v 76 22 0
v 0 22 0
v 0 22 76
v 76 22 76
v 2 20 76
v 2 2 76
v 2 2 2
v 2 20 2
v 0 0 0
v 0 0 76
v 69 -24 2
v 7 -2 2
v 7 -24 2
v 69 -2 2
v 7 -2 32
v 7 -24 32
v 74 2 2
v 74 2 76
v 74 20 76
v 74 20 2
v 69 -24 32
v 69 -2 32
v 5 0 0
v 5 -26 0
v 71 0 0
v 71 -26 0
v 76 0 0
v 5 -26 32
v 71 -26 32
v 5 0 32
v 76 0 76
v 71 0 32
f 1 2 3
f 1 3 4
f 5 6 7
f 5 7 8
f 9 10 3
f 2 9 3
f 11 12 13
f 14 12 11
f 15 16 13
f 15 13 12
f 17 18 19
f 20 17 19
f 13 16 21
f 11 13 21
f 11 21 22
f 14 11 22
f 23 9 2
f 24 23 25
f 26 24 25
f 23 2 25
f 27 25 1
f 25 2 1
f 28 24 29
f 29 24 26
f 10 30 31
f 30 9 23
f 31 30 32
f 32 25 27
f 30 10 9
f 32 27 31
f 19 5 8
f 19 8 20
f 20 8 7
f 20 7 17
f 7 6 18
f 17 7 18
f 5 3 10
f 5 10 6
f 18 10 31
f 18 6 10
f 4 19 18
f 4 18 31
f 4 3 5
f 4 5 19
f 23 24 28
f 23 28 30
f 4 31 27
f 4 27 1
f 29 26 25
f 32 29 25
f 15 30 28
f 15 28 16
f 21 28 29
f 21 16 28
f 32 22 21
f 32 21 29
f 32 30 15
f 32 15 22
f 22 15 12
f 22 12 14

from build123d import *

# Parameters (mm, degrees)
SKETCH_W        = 76
SKETCH_H        = 22
PAD_DEPTH       = 76
SKETCH001_W     = 66
SKETCH001_H     = 26
PAD001_DEPTH    = 32
SKETCH002_W     = 62
SKETCH002_H     = 22
POCKET_DEPTH    = 30
SKETCH003_W     = 72
SKETCH003_H     = 18
POCKET001_DEPTH = 74


with BuildPart() as part:
    # Sketch → Pad (new body)
    with BuildSketch(Plane.XY):
        with Locations((38, 11)):
            Rectangle(SKETCH_W, SKETCH_H)
    extrude(amount=PAD_DEPTH)

    # Sketch001 → Pad001 (join)
    with BuildSketch(Plane.XY):
        with Locations((38, -13)):
            Rectangle(SKETCH001_W, SKETCH001_H)
    extrude(amount=PAD001_DEPTH)

    # Sketch002 (on Face4 of Pad001) → Pocket (cut)
    with BuildSketch(Plane.XY.offset(32)):
        with Locations((38, -13)):
            Rectangle(SKETCH002_W, SKETCH002_H)
    extrude(amount=-POCKET_DEPTH, mode=Mode.SUBTRACT)

    # Sketch003 (on Face7 of Pocket) → Pocket001 (cut)
    with BuildSketch(Plane.XY.offset(76)):
        with Locations((38, 11)):
            Rectangle(SKETCH003_W, SKETCH003_H)
    extrude(amount=-POCKET001_DEPTH, mode=Mode.SUBTRACT)


solid = part.part
